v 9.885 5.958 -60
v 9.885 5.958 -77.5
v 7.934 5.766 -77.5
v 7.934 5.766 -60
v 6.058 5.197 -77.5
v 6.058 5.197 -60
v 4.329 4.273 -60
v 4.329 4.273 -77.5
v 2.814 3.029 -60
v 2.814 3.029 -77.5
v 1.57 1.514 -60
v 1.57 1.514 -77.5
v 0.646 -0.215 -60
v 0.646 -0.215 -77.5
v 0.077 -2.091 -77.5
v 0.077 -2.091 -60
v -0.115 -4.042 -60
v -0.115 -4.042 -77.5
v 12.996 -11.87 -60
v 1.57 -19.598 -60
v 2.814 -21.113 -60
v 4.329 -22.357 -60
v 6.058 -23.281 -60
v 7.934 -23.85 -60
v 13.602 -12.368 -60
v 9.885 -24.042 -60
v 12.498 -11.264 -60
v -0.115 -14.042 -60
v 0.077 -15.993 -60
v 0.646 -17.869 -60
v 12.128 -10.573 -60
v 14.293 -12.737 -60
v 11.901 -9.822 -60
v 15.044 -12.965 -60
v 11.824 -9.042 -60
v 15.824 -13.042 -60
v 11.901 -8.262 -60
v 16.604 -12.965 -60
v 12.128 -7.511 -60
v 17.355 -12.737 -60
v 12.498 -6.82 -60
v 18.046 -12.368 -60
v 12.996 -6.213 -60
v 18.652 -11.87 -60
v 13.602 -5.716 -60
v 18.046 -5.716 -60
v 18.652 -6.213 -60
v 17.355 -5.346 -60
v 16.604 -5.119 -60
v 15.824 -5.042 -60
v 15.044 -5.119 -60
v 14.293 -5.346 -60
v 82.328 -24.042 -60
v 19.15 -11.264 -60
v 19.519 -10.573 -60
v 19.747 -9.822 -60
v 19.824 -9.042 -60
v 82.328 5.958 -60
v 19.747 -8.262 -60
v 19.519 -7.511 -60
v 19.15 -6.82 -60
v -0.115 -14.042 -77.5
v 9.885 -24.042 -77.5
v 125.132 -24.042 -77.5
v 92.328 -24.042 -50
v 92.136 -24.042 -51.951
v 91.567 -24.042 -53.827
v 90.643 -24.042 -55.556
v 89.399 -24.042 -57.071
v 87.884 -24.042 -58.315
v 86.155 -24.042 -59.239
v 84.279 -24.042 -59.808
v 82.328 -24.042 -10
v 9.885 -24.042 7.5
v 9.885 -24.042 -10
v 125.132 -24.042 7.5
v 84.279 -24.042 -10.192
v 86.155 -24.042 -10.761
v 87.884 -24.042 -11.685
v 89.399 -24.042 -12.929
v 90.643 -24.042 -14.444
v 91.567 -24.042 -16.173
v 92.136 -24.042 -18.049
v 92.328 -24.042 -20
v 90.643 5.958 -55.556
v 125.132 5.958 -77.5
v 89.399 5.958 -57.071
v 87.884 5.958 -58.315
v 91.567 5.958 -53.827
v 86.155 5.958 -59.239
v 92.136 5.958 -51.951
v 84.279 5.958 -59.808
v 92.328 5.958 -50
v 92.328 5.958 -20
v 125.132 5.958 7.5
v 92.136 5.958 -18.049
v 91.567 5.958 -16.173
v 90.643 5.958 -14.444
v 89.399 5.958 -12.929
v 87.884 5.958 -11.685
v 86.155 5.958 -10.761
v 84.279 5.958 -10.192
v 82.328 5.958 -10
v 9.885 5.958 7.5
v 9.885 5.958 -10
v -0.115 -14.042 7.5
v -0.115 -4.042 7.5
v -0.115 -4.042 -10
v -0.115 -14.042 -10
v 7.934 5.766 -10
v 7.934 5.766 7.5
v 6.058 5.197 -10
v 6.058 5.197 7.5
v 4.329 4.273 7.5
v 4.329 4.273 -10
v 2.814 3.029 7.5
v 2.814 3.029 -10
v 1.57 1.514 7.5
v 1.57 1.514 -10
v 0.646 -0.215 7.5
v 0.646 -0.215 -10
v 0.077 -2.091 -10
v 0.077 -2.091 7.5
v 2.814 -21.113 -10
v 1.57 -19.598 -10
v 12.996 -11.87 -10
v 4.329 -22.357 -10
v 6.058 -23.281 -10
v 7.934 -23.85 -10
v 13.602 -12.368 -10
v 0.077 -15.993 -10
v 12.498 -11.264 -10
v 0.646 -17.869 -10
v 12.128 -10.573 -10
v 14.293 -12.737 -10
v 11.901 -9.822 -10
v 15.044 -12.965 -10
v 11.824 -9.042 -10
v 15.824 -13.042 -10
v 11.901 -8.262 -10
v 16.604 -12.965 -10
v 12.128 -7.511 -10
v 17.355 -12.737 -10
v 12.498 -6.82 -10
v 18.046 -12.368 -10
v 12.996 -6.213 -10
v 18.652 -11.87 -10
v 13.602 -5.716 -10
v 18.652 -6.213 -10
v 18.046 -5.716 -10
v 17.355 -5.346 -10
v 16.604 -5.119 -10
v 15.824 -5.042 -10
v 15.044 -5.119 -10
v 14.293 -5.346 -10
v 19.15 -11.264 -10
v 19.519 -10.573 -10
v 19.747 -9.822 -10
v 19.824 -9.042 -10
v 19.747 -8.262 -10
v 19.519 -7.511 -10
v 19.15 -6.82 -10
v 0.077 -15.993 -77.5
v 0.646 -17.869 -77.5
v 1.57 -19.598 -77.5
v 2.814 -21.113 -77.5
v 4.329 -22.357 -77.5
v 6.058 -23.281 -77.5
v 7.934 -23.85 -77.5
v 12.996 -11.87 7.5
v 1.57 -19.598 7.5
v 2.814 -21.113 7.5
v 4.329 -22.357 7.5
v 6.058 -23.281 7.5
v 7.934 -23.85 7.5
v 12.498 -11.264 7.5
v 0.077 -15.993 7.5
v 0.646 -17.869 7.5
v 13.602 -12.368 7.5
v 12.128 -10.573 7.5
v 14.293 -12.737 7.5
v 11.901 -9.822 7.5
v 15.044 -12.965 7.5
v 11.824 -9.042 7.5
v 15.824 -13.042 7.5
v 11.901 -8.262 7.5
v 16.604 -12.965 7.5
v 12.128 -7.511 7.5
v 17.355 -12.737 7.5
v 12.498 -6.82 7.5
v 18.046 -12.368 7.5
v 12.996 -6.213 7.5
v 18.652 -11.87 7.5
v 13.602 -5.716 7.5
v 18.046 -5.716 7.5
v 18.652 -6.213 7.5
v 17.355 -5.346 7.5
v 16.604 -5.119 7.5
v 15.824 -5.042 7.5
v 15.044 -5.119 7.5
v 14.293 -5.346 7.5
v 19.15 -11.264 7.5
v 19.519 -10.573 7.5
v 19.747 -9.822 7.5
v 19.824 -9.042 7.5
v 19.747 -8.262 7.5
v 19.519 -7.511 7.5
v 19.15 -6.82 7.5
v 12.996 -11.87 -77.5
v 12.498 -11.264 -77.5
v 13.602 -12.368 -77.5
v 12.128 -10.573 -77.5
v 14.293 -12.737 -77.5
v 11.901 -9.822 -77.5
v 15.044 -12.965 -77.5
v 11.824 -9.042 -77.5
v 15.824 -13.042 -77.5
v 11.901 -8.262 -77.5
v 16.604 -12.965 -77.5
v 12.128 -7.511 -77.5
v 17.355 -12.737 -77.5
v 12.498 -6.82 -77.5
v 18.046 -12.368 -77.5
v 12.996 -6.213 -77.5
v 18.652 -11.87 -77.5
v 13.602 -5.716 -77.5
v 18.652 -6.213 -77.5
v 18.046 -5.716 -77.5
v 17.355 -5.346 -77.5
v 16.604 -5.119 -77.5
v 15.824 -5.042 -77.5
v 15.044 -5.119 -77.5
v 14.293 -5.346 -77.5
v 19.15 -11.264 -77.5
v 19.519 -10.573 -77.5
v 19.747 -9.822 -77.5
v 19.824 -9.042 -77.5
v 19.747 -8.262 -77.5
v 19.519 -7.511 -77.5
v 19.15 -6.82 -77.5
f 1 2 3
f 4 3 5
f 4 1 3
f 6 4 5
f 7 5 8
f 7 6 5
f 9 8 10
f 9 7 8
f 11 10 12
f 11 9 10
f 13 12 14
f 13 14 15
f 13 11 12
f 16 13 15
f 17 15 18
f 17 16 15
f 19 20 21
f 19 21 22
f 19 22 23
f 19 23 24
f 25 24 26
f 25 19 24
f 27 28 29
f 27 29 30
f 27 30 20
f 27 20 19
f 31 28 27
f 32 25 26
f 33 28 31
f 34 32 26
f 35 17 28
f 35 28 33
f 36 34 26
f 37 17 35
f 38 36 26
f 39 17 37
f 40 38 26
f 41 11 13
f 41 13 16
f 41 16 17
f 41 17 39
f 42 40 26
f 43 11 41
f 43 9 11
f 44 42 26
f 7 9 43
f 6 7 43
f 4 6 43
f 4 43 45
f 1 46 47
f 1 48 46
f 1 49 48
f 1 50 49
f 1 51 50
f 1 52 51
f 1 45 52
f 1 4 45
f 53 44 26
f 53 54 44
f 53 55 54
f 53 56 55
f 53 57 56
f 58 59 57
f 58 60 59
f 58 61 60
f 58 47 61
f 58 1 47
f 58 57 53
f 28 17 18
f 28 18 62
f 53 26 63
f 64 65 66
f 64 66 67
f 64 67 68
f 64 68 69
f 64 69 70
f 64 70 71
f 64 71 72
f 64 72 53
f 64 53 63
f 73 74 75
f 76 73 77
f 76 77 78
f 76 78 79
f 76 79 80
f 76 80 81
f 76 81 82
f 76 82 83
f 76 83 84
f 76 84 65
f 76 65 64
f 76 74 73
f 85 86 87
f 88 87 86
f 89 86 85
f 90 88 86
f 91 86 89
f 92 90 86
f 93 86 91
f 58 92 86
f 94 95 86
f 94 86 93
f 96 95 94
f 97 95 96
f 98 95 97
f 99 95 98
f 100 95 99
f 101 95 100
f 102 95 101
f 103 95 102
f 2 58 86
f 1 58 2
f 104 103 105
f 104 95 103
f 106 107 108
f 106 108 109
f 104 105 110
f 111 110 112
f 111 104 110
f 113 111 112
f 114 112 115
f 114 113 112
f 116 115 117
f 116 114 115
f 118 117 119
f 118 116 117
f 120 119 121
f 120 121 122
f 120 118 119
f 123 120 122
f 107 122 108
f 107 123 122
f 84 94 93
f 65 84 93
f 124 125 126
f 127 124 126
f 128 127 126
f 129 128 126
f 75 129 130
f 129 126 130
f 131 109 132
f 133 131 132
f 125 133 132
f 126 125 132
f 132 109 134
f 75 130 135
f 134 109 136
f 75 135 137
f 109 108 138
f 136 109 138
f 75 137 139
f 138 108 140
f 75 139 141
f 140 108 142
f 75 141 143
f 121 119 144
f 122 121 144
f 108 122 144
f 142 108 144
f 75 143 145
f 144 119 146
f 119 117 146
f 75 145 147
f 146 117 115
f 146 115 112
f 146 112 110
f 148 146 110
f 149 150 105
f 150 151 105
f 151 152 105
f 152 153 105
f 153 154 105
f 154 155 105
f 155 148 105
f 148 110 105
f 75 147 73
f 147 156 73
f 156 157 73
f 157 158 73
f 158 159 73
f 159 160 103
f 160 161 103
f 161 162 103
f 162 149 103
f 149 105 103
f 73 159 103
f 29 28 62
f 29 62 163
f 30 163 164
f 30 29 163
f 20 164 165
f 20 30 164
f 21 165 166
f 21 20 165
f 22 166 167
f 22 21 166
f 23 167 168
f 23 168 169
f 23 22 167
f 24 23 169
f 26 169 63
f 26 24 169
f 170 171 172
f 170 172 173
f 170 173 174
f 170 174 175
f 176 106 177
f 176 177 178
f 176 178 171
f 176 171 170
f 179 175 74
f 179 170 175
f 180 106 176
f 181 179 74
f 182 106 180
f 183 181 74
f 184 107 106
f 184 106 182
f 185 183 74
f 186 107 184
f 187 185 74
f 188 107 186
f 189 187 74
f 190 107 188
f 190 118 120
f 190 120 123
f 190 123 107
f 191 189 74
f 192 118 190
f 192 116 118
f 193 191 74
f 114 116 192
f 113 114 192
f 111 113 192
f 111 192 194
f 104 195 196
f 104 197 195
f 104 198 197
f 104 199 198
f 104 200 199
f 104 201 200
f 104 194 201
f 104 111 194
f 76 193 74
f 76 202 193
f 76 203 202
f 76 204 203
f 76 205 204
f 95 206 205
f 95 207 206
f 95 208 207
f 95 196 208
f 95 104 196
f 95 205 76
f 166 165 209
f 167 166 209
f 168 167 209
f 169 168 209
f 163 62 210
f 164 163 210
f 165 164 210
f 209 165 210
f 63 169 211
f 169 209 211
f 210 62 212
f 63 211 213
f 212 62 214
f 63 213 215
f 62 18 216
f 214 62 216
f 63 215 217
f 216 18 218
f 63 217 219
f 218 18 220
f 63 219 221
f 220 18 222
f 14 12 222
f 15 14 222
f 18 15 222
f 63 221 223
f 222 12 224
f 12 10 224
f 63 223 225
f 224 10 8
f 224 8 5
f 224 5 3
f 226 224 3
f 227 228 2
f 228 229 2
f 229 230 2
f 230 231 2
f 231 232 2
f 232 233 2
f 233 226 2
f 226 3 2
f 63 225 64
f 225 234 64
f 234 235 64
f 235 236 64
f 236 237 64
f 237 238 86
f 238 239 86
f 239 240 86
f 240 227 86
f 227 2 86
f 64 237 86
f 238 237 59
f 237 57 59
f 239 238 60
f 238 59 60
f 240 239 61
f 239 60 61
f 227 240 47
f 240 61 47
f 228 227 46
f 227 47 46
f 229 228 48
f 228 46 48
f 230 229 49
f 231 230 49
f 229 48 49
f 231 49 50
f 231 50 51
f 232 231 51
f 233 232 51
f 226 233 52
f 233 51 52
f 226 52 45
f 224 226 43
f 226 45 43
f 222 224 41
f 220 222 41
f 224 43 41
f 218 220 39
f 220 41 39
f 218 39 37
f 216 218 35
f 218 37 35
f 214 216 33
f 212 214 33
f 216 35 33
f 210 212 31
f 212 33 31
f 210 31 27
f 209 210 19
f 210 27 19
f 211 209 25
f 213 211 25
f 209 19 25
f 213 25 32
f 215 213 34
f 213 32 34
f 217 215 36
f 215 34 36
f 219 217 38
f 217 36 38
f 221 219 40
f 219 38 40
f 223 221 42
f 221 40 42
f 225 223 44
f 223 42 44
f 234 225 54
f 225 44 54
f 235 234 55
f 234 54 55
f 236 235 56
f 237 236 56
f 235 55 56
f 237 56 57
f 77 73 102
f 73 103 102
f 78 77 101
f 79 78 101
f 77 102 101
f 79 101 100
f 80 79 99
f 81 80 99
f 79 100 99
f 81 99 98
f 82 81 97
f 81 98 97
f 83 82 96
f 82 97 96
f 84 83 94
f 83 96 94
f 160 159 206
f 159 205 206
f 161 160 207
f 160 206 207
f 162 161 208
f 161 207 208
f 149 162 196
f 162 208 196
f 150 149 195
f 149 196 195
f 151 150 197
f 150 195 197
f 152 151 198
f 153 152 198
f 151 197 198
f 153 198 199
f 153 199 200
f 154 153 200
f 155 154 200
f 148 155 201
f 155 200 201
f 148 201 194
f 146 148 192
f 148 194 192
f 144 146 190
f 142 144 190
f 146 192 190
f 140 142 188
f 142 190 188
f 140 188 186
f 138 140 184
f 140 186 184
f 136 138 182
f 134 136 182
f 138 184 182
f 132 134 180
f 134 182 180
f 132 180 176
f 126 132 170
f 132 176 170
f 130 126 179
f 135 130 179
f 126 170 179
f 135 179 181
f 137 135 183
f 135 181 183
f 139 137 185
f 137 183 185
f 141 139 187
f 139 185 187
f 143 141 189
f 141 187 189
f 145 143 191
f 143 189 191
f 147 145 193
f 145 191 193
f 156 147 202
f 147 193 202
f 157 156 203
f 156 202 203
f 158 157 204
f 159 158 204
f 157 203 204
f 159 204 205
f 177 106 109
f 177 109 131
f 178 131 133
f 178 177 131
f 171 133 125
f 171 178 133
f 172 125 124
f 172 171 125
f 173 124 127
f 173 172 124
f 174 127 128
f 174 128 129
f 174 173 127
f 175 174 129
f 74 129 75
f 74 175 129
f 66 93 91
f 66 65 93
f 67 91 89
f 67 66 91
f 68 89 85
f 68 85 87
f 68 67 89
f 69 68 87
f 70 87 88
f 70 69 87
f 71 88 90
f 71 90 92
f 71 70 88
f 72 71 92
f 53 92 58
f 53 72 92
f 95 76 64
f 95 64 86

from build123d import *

# Parameters (mm, degrees)
EXTRUDE_START       = 7.5
EXTRUDE_1_DEPTH     = 85
SKETCH_3_W          = 94.594294475
SKETCH_3_H          = 50
CUT_EXTRUDE_1_DEPTH = 43.5
SKETCH_4_R          = 4
CUT_EXTRUDE_2_DEPTH = 100
FILLET_1_R          = 10


with BuildPart() as part:
    # Эскиз1 → Вытянуть1 (new body)
    with BuildSketch(Plane.XY.offset(EXTRUDE_START)):
        with BuildLine():
            Line((-0.114856082, -4.041900761), (-0.114856082, -14.041900761))
            ThreePointArc((-0.114856082, -14.041900761), (2.814076106, -21.112968573), (9.885143918, -24.041900761))
            Line((9.885143918, -24.041900761), (125.131658012, -24.041900761))
            Line((125.131658012, -24.041900761), (125.131658012, 5.958099239))
            Line((125.131658012, 5.958099239), (9.885143918, 5.958099239))
            ThreePointArc((9.885143918, 5.958099239), (2.814076106, 3.02916705), (-0.114856082, -4.041900761))
        make_face()
    extrude(amount=-EXTRUDE_1_DEPTH)

    # Эскиз3 → Вырез-Вытянуть1 (cut, symmetric)
    with BuildSketch(Plane(origin=(0, 0, 0), x_dir=(1, 0, 0), z_dir=(0, 1, 0))):
        with Locations((45.031047777, 35)):
            Rectangle(SKETCH_3_W, SKETCH_3_H)
    extrude(amount=CUT_EXTRUDE_1_DEPTH, both=True, mode=Mode.SUBTRACT)

    # Эскиз4 → Вырез-Вытянуть2 (cut, symmetric)
    with BuildSketch(Plane.XY):
        with Locations((15.823953055, -9.041900761)):
            Circle(SKETCH_4_R)
    extrude(amount=CUT_EXTRUDE_2_DEPTH, both=True, mode=Mode.SUBTRACT)

    # Скругление1
    fillet_1_edges = [part.edges().sort_by_distance(p)[0] for p in [
        (92.328195015, -9.041900761, -60),
        (92.328195015, -9.041900761, -10),
    ]]
    fillet(fillet_1_edges, radius=FILLET_1_R)


solid = part.part
